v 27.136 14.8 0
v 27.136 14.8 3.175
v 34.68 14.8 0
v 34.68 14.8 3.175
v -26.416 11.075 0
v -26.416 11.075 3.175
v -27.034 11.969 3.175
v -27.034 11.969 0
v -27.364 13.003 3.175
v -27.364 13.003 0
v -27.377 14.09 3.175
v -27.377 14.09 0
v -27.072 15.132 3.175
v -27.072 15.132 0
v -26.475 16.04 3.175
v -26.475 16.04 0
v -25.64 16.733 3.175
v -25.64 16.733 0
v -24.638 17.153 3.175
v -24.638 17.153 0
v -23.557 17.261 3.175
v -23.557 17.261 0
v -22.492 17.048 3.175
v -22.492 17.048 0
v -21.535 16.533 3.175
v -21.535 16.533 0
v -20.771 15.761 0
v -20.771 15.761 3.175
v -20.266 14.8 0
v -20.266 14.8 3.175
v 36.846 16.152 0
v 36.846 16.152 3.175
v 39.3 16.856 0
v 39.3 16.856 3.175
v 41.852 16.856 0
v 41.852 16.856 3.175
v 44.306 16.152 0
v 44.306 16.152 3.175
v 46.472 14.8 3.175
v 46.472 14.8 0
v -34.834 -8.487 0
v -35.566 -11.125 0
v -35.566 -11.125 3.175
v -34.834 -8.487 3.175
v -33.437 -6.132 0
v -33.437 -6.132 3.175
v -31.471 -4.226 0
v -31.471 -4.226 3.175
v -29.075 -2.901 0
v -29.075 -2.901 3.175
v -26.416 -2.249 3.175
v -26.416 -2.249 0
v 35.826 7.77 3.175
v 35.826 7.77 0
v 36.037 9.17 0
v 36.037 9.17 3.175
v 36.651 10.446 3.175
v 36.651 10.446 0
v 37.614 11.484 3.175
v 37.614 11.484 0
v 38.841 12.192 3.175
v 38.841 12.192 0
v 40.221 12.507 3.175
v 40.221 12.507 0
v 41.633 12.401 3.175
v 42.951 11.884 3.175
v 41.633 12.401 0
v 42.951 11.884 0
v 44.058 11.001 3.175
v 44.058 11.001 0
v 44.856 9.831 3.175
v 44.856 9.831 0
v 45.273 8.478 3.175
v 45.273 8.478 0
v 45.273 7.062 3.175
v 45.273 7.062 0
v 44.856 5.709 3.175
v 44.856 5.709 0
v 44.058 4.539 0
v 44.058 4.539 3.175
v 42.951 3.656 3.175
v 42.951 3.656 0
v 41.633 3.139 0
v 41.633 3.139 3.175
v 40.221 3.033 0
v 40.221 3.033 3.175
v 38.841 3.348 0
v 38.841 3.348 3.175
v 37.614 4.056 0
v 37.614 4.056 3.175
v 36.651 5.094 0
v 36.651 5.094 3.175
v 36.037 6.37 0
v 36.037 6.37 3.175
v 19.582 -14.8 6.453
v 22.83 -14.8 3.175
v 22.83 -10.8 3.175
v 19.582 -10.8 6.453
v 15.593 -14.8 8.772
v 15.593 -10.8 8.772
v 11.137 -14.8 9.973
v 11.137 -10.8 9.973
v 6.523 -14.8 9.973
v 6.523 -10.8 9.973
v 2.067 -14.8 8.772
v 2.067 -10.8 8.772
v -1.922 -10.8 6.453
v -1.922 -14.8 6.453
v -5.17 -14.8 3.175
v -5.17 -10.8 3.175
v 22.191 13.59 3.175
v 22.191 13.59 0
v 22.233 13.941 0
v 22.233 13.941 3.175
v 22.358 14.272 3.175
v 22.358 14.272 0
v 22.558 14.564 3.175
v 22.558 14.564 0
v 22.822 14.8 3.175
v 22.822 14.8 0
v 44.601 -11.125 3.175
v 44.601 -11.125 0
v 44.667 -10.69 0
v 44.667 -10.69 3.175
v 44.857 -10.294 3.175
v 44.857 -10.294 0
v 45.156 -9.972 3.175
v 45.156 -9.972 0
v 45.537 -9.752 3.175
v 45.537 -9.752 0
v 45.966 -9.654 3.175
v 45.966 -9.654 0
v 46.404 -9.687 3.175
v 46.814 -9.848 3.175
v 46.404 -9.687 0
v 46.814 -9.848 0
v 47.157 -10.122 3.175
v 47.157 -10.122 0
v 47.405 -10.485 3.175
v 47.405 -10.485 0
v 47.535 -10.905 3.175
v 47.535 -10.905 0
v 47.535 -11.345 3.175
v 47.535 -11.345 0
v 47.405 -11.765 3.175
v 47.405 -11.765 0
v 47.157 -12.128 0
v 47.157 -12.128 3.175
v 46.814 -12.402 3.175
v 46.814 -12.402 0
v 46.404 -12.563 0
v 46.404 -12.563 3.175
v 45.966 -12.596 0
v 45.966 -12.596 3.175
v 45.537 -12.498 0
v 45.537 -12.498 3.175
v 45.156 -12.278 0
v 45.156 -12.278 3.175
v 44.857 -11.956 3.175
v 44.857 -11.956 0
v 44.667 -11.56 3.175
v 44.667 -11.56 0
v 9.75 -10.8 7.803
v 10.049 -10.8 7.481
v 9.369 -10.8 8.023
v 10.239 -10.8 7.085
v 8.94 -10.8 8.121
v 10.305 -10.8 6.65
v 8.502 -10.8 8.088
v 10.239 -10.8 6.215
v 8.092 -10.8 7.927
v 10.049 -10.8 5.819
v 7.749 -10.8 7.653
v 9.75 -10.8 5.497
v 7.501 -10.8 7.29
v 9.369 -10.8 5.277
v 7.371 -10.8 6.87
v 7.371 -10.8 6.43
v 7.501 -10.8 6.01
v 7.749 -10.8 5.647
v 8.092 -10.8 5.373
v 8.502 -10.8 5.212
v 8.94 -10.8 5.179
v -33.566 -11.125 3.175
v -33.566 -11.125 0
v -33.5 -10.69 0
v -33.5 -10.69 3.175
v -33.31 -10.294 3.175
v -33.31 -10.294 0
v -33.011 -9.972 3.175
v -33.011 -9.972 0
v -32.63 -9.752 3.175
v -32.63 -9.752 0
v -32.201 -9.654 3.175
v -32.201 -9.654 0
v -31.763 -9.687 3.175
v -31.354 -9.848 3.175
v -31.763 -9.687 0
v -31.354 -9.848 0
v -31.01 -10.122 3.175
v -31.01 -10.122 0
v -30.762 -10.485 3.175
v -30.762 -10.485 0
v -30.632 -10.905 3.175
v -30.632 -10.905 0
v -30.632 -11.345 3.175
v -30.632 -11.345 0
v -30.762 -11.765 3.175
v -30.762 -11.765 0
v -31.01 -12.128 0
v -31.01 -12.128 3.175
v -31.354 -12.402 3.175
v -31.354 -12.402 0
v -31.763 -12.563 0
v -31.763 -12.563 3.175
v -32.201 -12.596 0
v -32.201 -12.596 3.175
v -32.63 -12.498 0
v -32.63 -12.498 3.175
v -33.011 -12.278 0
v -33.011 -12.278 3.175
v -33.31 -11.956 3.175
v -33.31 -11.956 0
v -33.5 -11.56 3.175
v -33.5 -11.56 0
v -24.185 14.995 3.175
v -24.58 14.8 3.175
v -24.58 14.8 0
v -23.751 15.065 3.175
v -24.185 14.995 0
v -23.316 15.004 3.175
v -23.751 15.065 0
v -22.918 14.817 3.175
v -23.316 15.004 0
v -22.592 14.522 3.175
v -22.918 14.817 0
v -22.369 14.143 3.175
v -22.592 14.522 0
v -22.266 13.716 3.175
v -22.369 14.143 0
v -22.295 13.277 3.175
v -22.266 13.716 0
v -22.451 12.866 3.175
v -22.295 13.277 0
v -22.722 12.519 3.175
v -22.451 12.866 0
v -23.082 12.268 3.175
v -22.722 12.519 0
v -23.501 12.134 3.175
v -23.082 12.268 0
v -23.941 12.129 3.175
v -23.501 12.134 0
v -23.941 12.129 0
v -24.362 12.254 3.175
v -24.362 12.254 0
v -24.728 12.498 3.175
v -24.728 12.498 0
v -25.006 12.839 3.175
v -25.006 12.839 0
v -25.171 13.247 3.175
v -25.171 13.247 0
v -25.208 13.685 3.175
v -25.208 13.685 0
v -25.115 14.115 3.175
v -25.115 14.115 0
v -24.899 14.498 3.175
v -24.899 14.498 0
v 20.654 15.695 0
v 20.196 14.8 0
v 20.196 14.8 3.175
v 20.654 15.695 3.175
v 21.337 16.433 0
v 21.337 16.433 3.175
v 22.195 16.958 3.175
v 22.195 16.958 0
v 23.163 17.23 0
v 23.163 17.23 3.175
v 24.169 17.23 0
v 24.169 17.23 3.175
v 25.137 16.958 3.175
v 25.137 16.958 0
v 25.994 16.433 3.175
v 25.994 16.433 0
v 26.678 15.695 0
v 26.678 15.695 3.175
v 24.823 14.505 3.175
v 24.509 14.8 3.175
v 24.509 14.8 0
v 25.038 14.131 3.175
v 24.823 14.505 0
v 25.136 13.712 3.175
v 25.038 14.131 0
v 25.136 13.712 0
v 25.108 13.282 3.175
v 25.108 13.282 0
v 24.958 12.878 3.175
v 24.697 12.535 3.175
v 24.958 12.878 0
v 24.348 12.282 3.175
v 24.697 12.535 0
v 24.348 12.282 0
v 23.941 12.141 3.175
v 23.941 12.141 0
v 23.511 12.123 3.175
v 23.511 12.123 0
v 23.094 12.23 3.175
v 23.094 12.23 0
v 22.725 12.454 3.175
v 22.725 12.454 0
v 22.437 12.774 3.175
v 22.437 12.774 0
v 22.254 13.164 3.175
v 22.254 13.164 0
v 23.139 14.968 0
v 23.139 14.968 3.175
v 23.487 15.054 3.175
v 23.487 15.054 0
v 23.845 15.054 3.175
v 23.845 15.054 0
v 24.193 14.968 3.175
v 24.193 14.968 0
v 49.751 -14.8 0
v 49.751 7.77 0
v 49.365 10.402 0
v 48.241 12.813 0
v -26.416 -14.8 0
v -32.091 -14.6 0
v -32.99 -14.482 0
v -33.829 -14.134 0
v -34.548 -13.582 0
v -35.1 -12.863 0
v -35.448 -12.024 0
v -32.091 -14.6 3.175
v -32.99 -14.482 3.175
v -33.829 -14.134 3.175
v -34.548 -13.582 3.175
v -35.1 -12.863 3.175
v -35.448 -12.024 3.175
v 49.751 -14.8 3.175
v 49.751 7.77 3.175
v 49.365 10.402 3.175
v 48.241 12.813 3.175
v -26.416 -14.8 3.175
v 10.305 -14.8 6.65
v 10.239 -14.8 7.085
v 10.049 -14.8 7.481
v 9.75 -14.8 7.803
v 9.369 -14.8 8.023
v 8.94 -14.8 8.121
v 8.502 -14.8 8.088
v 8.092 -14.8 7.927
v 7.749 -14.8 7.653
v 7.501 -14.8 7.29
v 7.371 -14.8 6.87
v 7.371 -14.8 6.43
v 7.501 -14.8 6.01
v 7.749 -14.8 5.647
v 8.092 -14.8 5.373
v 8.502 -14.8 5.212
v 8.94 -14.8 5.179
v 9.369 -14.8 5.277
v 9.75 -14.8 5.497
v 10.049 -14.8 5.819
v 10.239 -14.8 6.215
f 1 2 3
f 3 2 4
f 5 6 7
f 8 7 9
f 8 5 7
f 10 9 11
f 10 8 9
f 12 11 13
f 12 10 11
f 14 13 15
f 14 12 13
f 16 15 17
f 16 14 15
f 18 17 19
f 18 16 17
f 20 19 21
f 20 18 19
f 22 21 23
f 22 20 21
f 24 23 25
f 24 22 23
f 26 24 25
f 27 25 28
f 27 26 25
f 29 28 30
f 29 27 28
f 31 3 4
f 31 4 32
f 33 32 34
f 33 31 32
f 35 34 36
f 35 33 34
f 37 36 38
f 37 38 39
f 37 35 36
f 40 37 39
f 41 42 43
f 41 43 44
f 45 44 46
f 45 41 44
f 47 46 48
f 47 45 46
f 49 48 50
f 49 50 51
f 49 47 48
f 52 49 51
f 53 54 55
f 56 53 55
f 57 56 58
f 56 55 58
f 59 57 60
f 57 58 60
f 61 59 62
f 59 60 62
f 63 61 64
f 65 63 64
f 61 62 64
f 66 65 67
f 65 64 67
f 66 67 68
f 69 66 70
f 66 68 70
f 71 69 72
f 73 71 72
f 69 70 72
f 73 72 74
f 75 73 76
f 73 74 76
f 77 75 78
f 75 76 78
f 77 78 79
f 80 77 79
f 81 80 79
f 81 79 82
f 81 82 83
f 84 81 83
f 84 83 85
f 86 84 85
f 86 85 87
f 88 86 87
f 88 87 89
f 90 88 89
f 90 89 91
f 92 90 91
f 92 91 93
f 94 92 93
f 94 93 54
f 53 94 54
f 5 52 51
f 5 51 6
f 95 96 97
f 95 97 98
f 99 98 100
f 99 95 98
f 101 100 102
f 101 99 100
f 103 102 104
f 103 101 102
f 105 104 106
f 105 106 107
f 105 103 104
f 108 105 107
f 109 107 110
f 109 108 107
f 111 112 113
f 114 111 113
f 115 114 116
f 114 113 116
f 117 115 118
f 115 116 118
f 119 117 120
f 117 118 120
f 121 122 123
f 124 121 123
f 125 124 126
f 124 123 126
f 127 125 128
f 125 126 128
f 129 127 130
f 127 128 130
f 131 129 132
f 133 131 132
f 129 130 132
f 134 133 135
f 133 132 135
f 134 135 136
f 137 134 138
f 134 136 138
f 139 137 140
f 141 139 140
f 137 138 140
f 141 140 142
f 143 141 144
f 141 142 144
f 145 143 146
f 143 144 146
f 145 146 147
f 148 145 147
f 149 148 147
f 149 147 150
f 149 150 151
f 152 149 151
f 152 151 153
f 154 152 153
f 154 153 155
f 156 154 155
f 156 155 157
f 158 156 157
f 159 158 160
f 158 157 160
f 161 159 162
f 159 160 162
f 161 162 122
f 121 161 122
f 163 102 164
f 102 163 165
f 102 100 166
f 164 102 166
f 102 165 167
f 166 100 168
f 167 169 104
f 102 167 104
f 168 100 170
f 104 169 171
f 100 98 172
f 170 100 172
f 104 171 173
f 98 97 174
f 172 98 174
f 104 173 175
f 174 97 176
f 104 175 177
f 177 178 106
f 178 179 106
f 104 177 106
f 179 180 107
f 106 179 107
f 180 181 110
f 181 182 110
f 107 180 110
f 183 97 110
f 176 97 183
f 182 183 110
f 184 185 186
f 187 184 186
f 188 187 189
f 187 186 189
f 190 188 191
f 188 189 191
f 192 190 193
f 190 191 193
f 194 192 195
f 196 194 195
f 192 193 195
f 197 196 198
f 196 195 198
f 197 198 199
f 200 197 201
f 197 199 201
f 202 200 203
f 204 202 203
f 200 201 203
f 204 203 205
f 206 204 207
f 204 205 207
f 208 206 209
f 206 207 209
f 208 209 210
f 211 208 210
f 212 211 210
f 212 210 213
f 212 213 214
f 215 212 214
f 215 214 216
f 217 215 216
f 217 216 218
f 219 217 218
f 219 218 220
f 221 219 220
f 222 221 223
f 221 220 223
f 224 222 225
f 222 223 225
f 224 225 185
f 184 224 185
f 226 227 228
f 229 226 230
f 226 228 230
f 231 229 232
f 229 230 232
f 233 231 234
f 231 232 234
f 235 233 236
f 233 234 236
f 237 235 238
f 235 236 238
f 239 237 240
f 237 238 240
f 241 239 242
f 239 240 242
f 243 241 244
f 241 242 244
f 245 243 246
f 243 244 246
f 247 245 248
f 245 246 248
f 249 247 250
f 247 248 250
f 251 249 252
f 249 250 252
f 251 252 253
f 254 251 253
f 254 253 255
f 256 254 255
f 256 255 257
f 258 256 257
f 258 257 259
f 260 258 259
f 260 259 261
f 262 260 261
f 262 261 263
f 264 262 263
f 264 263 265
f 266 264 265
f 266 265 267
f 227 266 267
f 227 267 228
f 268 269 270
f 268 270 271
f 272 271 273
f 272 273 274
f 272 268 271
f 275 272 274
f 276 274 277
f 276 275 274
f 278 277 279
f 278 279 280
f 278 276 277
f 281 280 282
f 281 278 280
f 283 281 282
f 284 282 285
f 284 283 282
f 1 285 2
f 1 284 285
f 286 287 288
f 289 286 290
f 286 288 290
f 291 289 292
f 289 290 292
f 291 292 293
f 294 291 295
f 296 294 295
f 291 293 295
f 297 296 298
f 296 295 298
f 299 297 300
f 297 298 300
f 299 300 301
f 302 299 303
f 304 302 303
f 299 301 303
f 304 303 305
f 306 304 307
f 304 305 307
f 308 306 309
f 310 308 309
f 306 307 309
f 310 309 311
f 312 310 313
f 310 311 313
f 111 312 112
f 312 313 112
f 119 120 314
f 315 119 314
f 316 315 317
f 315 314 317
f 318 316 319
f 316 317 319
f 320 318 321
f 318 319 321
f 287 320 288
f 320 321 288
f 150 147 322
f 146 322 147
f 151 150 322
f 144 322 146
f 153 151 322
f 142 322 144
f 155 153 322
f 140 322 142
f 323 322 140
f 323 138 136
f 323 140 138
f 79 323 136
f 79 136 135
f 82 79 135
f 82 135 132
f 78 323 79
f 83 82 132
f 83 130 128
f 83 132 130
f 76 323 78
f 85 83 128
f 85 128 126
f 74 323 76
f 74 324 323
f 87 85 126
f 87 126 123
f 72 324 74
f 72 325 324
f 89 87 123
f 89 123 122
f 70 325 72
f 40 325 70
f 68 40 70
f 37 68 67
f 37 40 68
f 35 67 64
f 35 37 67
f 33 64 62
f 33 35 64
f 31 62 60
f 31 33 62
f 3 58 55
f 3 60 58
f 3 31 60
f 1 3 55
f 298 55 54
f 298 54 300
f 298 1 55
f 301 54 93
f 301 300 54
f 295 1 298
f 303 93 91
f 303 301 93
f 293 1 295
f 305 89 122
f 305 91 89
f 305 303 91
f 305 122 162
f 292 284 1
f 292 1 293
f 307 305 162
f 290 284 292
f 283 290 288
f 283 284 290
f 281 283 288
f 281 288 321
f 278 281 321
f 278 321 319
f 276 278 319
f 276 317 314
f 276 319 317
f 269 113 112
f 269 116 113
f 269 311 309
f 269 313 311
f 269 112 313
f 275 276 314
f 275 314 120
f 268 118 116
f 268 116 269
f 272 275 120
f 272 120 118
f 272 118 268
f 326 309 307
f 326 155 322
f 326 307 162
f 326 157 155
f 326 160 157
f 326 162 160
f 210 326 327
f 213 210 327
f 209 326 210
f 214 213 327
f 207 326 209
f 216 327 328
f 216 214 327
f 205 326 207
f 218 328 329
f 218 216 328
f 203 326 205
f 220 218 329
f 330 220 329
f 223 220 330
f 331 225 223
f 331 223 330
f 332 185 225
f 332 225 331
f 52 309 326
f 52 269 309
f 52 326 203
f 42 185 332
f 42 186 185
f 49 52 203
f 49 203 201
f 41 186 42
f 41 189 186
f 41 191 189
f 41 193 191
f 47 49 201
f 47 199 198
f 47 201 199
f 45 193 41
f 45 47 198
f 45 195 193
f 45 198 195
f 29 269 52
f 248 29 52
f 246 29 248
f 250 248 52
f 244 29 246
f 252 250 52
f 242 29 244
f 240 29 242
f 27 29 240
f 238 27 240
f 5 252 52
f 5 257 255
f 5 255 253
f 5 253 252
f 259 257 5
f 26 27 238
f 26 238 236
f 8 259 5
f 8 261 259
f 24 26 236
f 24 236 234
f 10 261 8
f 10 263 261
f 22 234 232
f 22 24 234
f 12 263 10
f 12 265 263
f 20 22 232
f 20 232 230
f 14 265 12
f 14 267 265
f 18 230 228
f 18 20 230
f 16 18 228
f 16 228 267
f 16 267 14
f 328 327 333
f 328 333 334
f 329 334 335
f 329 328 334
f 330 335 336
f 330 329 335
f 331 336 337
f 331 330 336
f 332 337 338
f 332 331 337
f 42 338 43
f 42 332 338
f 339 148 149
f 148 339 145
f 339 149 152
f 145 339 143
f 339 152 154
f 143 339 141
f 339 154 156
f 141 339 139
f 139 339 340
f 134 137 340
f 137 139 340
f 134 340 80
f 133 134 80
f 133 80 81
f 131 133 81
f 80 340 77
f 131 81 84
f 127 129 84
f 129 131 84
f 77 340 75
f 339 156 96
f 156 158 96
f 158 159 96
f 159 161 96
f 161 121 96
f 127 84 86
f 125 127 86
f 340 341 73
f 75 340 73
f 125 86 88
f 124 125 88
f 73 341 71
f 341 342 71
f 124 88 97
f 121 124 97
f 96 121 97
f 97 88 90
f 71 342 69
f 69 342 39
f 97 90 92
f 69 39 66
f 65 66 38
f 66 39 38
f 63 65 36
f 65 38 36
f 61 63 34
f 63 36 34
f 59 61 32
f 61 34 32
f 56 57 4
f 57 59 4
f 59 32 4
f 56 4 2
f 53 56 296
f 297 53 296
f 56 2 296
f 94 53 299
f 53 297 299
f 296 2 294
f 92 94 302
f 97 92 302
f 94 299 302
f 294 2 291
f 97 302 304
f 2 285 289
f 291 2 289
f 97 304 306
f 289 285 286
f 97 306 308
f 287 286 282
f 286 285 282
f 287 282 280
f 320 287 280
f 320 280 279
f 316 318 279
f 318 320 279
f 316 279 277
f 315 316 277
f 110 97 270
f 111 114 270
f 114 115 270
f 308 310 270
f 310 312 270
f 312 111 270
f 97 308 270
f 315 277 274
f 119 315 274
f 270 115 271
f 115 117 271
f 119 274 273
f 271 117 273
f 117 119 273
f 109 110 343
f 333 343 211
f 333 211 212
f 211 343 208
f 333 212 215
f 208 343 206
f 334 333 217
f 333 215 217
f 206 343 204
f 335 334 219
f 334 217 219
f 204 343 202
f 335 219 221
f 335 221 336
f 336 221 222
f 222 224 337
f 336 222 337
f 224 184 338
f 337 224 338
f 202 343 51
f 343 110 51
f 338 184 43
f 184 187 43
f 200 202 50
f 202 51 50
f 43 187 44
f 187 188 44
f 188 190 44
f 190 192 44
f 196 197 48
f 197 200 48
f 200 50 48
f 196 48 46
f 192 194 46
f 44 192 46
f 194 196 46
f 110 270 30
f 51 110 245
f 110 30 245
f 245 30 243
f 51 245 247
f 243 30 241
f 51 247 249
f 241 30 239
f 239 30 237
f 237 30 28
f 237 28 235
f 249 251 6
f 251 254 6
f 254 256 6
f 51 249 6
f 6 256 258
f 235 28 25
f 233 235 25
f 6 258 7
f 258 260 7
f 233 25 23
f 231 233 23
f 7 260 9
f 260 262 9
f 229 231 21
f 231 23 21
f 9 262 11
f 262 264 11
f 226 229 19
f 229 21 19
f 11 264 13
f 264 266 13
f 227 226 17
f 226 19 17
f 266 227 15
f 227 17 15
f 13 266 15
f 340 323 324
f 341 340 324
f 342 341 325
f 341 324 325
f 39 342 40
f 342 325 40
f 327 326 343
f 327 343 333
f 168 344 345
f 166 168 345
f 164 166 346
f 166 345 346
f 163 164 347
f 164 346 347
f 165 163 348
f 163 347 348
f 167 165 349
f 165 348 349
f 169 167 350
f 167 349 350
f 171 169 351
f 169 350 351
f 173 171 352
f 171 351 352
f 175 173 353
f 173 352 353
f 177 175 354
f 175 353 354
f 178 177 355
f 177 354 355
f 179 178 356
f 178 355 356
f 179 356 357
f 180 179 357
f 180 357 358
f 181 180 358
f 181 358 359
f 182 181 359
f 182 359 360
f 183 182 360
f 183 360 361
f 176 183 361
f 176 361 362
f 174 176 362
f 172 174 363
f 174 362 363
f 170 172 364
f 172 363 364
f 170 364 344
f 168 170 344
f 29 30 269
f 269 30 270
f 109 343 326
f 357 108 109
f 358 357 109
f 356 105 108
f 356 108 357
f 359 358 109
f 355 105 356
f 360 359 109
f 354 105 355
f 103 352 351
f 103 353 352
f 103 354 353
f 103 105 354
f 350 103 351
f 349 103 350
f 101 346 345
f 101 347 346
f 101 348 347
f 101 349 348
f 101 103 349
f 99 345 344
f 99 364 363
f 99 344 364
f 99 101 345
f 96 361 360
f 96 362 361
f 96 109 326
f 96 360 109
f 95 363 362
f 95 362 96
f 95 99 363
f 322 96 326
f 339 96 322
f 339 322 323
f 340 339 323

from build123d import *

# Parameters (mm, degrees)
SKETCH1_W            = 6.266
SKETCH1_H            = 19.6
SKETCH1_R            = 1.675
SKETCH1_W_2          = 52.832
SKETCH1_H_2          = 5
BOSS_EXTRUDE2_DEPTH  = 3.175
SKETCH3_W            = 30
SKETCH3_H            = 29.6
BOSS_EXTRUDE3_DEPTH  = 3.175
SKETCH4_R            = 4.75
CUT_EXTRUDE1_DEPTH   = 10
BOSS_EXTRUDE14_DEPTH = 3.175
CUT_EXTRUDE8_DEPTH   = 10
SKETCH24_R           = 1.475
CUT_EXTRUDE9_DEPTH   = 10
SKETCH25_R           = 3.675
SKETCH25_R_2         = 1.675
BOSS_EXTRUDE15_DEPTH = 3.175
SKETCH26_R           = 1.475
CUT_EXTRUDE12_DEPTH  = 3.175
CUT_EXTRUDE13_DEPTH  = 10
SKETCH28_R           = 3.675
SKETCH28_R_2         = 1.675
BOSS_EXTRUDE16_DEPTH = 3.175
SKETCH29_R           = 1.475
BOSS_EXTRUDE17_DEPTH = 3.175
SKETCH30_W           = 52.236337303
SKETCH30_H           = 21.491937942
BOSS_EXTRUDE18_DEPTH = 3.175
CUT_EXTRUDE14_DEPTH  = 10
SKETCH32_R           = 1.475
BOSS_EXTRUDE19_DEPTH = 4
SKETCH33_R           = 2.220955703
SKETCH33_R_2         = 1.475
SKETCH33_R_3         = 2.214708119
BOSS_EXTRUDE20_DEPTH = 3.175
SKETCH34_R           = 1.475
BOSS_EXTRUDE21_DEPTH = 4


with BuildPart() as part:
    # Sketch1 → Boss-Extrude2 (new body)
    # profile 1 of 4: a face of its own
    with BuildSketch(Plane.XY):
        with Locations((-23.283, 0)):
            Rectangle(SKETCH1_W, SKETCH1_H)
        with Locations((-23.95, -4.974)):
            Circle(SKETCH1_R, mode=Mode.SUBTRACT)
        with Locations((-23.95, 4.974)):
            Circle(SKETCH1_R, mode=Mode.SUBTRACT)
    # profile 2 of 4: a face of its own
    with BuildSketch(Plane.XY):
        with Locations((0, -12.3)):
            Rectangle(SKETCH1_W_2, SKETCH1_H_2)
    # profile 3 of 4: a face of its own
    with BuildSketch(Plane.XY):
        with Locations((0, 12.3)):
            Rectangle(SKETCH1_W_2, SKETCH1_H_2)
    # profile 4 of 4: a face of its own
    with BuildSketch(Plane.XY):
        with Locations((23.283, 0)):
            Rectangle(SKETCH1_W, SKETCH1_H)
        with Locations((23.95, -4.974)):
            Circle(SKETCH1_R, mode=Mode.SUBTRACT)
        with Locations((23.95, 4.974)):
            Circle(SKETCH1_R, mode=Mode.SUBTRACT)
    extrude(amount=BOSS_EXTRUDE2_DEPTH)

    # Sketch3 → Boss-Extrude3 (add)
    with BuildSketch(Plane.XY.offset(3.175)):
        with Locations((41.416, 0)):
            Rectangle(SKETCH3_W, SKETCH3_H)
    extrude(amount=-BOSS_EXTRUDE3_DEPTH)

    # Sketch4 → Cut-Extrude1 (cut)
    with BuildSketch(Plane(origin=(0, 0, 0), x_dir=(-1, 0, 0), z_dir=(0, 0, -1))):
        with Locations((-40.576, 7.77)):
            Circle(SKETCH4_R)
    extrude(amount=-CUT_EXTRUDE1_DEPTH, mode=Mode.SUBTRACT)

    # Sketch22 → Boss-Extrude14 (add)
    with BuildSketch(Plane(origin=(0, 0, 0), x_dir=(-1, 0, 0), z_dir=(0, 0, -1))):
        with BuildLine():
            ThreePointArc((-34.680262133, 14.8), (-40.576, 16.945), (-46.471737867, 14.8))
            Line((-46.471737867, 14.8), (-34.680262133, 14.8))
        make_face()
    extrude(amount=-BOSS_EXTRUDE14_DEPTH)

    # Sketch23 → Cut-Extrude8 (cut)
    with BuildSketch(Plane(origin=(0, 0, 0), x_dir=(-1, 0, 0), z_dir=(0, 0, -1))):
        with BuildLine():
            Line((-49.751, -14.8), (-49.751, 7.77))
            ThreePointArc((-49.751, 7.77), (-48.890866804, 11.648609936), (-46.471737867, 14.8))
            Line((-46.471737867, 14.8), (-56.416, 14.8))
            Line((-56.416, 14.8), (-56.416, -14.8))
            Line((-56.416, -14.8), (-49.751, -14.8))
        make_face()
    extrude(amount=-CUT_EXTRUDE8_DEPTH, mode=Mode.SUBTRACT)

    # Sketch24 → Cut-Extrude9 (cut)
    with BuildSketch(Plane(origin=(0, 0, 0), x_dir=(-1, 0, 0), z_dir=(0, 0, -1))):
        with Locations((23.736, 13.59)):
            Circle(SKETCH24_R)
    extrude(amount=-CUT_EXTRUDE9_DEPTH, mode=Mode.SUBTRACT)

    # Sketch25 → Boss-Extrude15 (add)
    # profile 1 of 3: a face of its own
    with BuildSketch(Plane(origin=(0, 0, 0), x_dir=(-1, 0, 0), z_dir=(0, 0, -1))):
        with Locations((23.95, -4.974)):
            Circle(SKETCH25_R)
        with Locations(Location((23.95, -4.974, 0), (0, 0, 180))):
            Circle(SKETCH25_R_2, mode=Mode.SUBTRACT)
    # profile 2 of 3: a face of its own
    with BuildSketch(Plane(origin=(0, 0, 0), x_dir=(-1, 0, 0), z_dir=(0, 0, -1))):
        with Locations((23.95, 4.974)):
            Circle(SKETCH25_R)
        with Locations(Location((23.95, 4.974, 0), (0, 0, 180))):
            Circle(SKETCH25_R_2, mode=Mode.SUBTRACT)
    # profile 3 of 3: a face of its own
    with BuildSketch(Plane(origin=(0, 0, 0), x_dir=(-1, 0, 0), z_dir=(0, 0, -1))):
        with Locations((23.736, 13.59)):
            Circle(SKETCH25_R)
        with Locations((23.736, 13.59)):
            Circle(SKETCH25_R_2, mode=Mode.SUBTRACT)
    extrude(amount=-BOSS_EXTRUDE15_DEPTH)

    # Sketch26 → Cut-Extrude12 (cut)
    with BuildSketch(Plane(origin=(0, 0, 0), x_dir=(-1, 0, 0), z_dir=(0, 0, -1))):
        with Locations((-46.076, -11.125)):
            Circle(SKETCH26_R)
    extrude(amount=-CUT_EXTRUDE12_DEPTH, mode=Mode.SUBTRACT)

    # Sketch27 → Cut-Extrude13 (cut)
    with BuildSketch(Plane(origin=(0, 0, 0), x_dir=(-1, 0, 0), z_dir=(0, 0, -1))):
        with BuildLine():
            ThreePointArc((-22.190754209, 13.59), (-22.358119678, 14.272434563), (-22.822234796, 14.8))
            Line((-22.822234796, 14.8), (-24.509273622, 14.8))
            ThreePointArc((-24.509273622, 14.8), (-24.348188772, 12.282365469), (-22.190754209, 13.59))
        make_face()
        with BuildLine():
            Line((-24.509273622, 14.8), (-22.822234796, 14.8))
            ThreePointArc((-22.822234796, 14.8), (-23.665754209, 15.065), (-24.509273622, 14.8))
        make_face()
    extrude(amount=-CUT_EXTRUDE13_DEPTH, mode=Mode.SUBTRACT)

    # Sketch28 → Boss-Extrude16 (add)
    with BuildSketch(Plane(origin=(0, 0, 0), x_dir=(-1, 0, 0), z_dir=(0, 0, -1))):
        with Locations((-23.665754209, 13.59)):
            Circle(SKETCH28_R)
        with Locations((-23.665754209, 13.59)):
            Circle(SKETCH28_R_2, mode=Mode.SUBTRACT)
    extrude(amount=-BOSS_EXTRUDE16_DEPTH)

    # Sketch29 → Boss-Extrude17 (add)
    with BuildSketch(Plane(origin=(0, 0, 0), x_dir=(-1, 0, 0), z_dir=(0, 0, -1))):
        with BuildLine():
            ThreePointArc((35.566, -11.125), (32.517318638, -5.113632727), (26.416, -2.249212118))
            Line((26.416, -2.249212118), (26.416, -14.8))
            Line((26.416, -14.8), (32.091, -14.6))
            ThreePointArc((32.091, -14.6), (34.548196065, -13.582196065), (35.566, -11.125))
        make_face()
        with Locations((32.091, -11.125)):
            Circle(SKETCH29_R, mode=Mode.SUBTRACT)
    extrude(amount=-BOSS_EXTRUDE17_DEPTH)

    # Sketch30 → Boss-Extrude18 (add)
    with BuildSketch(Plane(origin=(0, 0, 0), x_dir=(-1, 0, 0), z_dir=(0, 0, -1))):
        with Locations((-0.180648482, 0.066835569)):
            Rectangle(SKETCH30_W, SKETCH30_H)
    extrude(amount=-BOSS_EXTRUDE18_DEPTH)

    # Sketch31 → Cut-Extrude14 (cut)
    with BuildSketch(Plane(origin=(0, 0, 0), x_dir=(-1, 0, 0), z_dir=(0, 0, -1))):
        Polygon((26.416, 9.86570219), (26.416, 0.686094798), (31.474426215, 3.163131713), align=None)
    extrude(amount=-CUT_EXTRUDE14_DEPTH, mode=Mode.SUBTRACT)

    # Sketch32 → Boss-Extrude19 (add)
    with BuildSketch(Plane(origin=(0, -14.8, 0), x_dir=(-1, 0, 0), z_dir=(0, -1, 0))):
        with BuildLine():
            ThreePointArc((-22.83, -3.175), (-16.387108849, -7.772233652), (-8.83, -10.125))
            ThreePointArc((-8.83, -10.125), (-1.272891151, -7.772233652), (5.17, -3.175))
            Line((5.17, -3.175), (-22.83, -3.175))
        make_face()
        with Locations(Location((-8.83, -6.65, 0), (0, 0, 180))):
            Circle(SKETCH32_R, mode=Mode.SUBTRACT)
    extrude(amount=-BOSS_EXTRUDE19_DEPTH)

    # Sketch33 → Boss-Extrude20 (add)
    # profile 1 of 2: a face of its own
    with BuildSketch(Plane(origin=(0, 0, 0), x_dir=(-1, 0, 0), z_dir=(0, 0, -1))):
        with Locations((-23.665754209, 13.59)):
            Circle(SKETCH33_R)
        with Locations((-23.665754209, 13.59)):
            Circle(SKETCH33_R_2, mode=Mode.SUBTRACT)
    # profile 2 of 2: a face of its own
    with BuildSketch(Plane(origin=(0, 0, 0), x_dir=(-1, 0, 0), z_dir=(0, 0, -1))):
        with Locations((23.736, 13.59)):
            Circle(SKETCH33_R_3)
        with Locations((23.736, 13.59)):
            Circle(SKETCH33_R_2, mode=Mode.SUBTRACT)
    extrude(amount=-BOSS_EXTRUDE20_DEPTH)

    # Sketch34 → Boss-Extrude21 (add)
    with BuildSketch(Plane(origin=(0, -14.8, 0), x_dir=(-1, 0, 0), z_dir=(0, -1, 0))):
        with BuildLine():
            Line((5.17, -3.175), (-22.83, -3.175))
            ThreePointArc((-22.83, -3.175), (-8.83, -10.125), (5.17, -3.175))
        make_face()
        with Locations(Location((-8.83, -6.65, 0), (0, 0, 180))):
            Circle(SKETCH34_R, mode=Mode.SUBTRACT)
    extrude(amount=-BOSS_EXTRUDE21_DEPTH)


solid = part.part
